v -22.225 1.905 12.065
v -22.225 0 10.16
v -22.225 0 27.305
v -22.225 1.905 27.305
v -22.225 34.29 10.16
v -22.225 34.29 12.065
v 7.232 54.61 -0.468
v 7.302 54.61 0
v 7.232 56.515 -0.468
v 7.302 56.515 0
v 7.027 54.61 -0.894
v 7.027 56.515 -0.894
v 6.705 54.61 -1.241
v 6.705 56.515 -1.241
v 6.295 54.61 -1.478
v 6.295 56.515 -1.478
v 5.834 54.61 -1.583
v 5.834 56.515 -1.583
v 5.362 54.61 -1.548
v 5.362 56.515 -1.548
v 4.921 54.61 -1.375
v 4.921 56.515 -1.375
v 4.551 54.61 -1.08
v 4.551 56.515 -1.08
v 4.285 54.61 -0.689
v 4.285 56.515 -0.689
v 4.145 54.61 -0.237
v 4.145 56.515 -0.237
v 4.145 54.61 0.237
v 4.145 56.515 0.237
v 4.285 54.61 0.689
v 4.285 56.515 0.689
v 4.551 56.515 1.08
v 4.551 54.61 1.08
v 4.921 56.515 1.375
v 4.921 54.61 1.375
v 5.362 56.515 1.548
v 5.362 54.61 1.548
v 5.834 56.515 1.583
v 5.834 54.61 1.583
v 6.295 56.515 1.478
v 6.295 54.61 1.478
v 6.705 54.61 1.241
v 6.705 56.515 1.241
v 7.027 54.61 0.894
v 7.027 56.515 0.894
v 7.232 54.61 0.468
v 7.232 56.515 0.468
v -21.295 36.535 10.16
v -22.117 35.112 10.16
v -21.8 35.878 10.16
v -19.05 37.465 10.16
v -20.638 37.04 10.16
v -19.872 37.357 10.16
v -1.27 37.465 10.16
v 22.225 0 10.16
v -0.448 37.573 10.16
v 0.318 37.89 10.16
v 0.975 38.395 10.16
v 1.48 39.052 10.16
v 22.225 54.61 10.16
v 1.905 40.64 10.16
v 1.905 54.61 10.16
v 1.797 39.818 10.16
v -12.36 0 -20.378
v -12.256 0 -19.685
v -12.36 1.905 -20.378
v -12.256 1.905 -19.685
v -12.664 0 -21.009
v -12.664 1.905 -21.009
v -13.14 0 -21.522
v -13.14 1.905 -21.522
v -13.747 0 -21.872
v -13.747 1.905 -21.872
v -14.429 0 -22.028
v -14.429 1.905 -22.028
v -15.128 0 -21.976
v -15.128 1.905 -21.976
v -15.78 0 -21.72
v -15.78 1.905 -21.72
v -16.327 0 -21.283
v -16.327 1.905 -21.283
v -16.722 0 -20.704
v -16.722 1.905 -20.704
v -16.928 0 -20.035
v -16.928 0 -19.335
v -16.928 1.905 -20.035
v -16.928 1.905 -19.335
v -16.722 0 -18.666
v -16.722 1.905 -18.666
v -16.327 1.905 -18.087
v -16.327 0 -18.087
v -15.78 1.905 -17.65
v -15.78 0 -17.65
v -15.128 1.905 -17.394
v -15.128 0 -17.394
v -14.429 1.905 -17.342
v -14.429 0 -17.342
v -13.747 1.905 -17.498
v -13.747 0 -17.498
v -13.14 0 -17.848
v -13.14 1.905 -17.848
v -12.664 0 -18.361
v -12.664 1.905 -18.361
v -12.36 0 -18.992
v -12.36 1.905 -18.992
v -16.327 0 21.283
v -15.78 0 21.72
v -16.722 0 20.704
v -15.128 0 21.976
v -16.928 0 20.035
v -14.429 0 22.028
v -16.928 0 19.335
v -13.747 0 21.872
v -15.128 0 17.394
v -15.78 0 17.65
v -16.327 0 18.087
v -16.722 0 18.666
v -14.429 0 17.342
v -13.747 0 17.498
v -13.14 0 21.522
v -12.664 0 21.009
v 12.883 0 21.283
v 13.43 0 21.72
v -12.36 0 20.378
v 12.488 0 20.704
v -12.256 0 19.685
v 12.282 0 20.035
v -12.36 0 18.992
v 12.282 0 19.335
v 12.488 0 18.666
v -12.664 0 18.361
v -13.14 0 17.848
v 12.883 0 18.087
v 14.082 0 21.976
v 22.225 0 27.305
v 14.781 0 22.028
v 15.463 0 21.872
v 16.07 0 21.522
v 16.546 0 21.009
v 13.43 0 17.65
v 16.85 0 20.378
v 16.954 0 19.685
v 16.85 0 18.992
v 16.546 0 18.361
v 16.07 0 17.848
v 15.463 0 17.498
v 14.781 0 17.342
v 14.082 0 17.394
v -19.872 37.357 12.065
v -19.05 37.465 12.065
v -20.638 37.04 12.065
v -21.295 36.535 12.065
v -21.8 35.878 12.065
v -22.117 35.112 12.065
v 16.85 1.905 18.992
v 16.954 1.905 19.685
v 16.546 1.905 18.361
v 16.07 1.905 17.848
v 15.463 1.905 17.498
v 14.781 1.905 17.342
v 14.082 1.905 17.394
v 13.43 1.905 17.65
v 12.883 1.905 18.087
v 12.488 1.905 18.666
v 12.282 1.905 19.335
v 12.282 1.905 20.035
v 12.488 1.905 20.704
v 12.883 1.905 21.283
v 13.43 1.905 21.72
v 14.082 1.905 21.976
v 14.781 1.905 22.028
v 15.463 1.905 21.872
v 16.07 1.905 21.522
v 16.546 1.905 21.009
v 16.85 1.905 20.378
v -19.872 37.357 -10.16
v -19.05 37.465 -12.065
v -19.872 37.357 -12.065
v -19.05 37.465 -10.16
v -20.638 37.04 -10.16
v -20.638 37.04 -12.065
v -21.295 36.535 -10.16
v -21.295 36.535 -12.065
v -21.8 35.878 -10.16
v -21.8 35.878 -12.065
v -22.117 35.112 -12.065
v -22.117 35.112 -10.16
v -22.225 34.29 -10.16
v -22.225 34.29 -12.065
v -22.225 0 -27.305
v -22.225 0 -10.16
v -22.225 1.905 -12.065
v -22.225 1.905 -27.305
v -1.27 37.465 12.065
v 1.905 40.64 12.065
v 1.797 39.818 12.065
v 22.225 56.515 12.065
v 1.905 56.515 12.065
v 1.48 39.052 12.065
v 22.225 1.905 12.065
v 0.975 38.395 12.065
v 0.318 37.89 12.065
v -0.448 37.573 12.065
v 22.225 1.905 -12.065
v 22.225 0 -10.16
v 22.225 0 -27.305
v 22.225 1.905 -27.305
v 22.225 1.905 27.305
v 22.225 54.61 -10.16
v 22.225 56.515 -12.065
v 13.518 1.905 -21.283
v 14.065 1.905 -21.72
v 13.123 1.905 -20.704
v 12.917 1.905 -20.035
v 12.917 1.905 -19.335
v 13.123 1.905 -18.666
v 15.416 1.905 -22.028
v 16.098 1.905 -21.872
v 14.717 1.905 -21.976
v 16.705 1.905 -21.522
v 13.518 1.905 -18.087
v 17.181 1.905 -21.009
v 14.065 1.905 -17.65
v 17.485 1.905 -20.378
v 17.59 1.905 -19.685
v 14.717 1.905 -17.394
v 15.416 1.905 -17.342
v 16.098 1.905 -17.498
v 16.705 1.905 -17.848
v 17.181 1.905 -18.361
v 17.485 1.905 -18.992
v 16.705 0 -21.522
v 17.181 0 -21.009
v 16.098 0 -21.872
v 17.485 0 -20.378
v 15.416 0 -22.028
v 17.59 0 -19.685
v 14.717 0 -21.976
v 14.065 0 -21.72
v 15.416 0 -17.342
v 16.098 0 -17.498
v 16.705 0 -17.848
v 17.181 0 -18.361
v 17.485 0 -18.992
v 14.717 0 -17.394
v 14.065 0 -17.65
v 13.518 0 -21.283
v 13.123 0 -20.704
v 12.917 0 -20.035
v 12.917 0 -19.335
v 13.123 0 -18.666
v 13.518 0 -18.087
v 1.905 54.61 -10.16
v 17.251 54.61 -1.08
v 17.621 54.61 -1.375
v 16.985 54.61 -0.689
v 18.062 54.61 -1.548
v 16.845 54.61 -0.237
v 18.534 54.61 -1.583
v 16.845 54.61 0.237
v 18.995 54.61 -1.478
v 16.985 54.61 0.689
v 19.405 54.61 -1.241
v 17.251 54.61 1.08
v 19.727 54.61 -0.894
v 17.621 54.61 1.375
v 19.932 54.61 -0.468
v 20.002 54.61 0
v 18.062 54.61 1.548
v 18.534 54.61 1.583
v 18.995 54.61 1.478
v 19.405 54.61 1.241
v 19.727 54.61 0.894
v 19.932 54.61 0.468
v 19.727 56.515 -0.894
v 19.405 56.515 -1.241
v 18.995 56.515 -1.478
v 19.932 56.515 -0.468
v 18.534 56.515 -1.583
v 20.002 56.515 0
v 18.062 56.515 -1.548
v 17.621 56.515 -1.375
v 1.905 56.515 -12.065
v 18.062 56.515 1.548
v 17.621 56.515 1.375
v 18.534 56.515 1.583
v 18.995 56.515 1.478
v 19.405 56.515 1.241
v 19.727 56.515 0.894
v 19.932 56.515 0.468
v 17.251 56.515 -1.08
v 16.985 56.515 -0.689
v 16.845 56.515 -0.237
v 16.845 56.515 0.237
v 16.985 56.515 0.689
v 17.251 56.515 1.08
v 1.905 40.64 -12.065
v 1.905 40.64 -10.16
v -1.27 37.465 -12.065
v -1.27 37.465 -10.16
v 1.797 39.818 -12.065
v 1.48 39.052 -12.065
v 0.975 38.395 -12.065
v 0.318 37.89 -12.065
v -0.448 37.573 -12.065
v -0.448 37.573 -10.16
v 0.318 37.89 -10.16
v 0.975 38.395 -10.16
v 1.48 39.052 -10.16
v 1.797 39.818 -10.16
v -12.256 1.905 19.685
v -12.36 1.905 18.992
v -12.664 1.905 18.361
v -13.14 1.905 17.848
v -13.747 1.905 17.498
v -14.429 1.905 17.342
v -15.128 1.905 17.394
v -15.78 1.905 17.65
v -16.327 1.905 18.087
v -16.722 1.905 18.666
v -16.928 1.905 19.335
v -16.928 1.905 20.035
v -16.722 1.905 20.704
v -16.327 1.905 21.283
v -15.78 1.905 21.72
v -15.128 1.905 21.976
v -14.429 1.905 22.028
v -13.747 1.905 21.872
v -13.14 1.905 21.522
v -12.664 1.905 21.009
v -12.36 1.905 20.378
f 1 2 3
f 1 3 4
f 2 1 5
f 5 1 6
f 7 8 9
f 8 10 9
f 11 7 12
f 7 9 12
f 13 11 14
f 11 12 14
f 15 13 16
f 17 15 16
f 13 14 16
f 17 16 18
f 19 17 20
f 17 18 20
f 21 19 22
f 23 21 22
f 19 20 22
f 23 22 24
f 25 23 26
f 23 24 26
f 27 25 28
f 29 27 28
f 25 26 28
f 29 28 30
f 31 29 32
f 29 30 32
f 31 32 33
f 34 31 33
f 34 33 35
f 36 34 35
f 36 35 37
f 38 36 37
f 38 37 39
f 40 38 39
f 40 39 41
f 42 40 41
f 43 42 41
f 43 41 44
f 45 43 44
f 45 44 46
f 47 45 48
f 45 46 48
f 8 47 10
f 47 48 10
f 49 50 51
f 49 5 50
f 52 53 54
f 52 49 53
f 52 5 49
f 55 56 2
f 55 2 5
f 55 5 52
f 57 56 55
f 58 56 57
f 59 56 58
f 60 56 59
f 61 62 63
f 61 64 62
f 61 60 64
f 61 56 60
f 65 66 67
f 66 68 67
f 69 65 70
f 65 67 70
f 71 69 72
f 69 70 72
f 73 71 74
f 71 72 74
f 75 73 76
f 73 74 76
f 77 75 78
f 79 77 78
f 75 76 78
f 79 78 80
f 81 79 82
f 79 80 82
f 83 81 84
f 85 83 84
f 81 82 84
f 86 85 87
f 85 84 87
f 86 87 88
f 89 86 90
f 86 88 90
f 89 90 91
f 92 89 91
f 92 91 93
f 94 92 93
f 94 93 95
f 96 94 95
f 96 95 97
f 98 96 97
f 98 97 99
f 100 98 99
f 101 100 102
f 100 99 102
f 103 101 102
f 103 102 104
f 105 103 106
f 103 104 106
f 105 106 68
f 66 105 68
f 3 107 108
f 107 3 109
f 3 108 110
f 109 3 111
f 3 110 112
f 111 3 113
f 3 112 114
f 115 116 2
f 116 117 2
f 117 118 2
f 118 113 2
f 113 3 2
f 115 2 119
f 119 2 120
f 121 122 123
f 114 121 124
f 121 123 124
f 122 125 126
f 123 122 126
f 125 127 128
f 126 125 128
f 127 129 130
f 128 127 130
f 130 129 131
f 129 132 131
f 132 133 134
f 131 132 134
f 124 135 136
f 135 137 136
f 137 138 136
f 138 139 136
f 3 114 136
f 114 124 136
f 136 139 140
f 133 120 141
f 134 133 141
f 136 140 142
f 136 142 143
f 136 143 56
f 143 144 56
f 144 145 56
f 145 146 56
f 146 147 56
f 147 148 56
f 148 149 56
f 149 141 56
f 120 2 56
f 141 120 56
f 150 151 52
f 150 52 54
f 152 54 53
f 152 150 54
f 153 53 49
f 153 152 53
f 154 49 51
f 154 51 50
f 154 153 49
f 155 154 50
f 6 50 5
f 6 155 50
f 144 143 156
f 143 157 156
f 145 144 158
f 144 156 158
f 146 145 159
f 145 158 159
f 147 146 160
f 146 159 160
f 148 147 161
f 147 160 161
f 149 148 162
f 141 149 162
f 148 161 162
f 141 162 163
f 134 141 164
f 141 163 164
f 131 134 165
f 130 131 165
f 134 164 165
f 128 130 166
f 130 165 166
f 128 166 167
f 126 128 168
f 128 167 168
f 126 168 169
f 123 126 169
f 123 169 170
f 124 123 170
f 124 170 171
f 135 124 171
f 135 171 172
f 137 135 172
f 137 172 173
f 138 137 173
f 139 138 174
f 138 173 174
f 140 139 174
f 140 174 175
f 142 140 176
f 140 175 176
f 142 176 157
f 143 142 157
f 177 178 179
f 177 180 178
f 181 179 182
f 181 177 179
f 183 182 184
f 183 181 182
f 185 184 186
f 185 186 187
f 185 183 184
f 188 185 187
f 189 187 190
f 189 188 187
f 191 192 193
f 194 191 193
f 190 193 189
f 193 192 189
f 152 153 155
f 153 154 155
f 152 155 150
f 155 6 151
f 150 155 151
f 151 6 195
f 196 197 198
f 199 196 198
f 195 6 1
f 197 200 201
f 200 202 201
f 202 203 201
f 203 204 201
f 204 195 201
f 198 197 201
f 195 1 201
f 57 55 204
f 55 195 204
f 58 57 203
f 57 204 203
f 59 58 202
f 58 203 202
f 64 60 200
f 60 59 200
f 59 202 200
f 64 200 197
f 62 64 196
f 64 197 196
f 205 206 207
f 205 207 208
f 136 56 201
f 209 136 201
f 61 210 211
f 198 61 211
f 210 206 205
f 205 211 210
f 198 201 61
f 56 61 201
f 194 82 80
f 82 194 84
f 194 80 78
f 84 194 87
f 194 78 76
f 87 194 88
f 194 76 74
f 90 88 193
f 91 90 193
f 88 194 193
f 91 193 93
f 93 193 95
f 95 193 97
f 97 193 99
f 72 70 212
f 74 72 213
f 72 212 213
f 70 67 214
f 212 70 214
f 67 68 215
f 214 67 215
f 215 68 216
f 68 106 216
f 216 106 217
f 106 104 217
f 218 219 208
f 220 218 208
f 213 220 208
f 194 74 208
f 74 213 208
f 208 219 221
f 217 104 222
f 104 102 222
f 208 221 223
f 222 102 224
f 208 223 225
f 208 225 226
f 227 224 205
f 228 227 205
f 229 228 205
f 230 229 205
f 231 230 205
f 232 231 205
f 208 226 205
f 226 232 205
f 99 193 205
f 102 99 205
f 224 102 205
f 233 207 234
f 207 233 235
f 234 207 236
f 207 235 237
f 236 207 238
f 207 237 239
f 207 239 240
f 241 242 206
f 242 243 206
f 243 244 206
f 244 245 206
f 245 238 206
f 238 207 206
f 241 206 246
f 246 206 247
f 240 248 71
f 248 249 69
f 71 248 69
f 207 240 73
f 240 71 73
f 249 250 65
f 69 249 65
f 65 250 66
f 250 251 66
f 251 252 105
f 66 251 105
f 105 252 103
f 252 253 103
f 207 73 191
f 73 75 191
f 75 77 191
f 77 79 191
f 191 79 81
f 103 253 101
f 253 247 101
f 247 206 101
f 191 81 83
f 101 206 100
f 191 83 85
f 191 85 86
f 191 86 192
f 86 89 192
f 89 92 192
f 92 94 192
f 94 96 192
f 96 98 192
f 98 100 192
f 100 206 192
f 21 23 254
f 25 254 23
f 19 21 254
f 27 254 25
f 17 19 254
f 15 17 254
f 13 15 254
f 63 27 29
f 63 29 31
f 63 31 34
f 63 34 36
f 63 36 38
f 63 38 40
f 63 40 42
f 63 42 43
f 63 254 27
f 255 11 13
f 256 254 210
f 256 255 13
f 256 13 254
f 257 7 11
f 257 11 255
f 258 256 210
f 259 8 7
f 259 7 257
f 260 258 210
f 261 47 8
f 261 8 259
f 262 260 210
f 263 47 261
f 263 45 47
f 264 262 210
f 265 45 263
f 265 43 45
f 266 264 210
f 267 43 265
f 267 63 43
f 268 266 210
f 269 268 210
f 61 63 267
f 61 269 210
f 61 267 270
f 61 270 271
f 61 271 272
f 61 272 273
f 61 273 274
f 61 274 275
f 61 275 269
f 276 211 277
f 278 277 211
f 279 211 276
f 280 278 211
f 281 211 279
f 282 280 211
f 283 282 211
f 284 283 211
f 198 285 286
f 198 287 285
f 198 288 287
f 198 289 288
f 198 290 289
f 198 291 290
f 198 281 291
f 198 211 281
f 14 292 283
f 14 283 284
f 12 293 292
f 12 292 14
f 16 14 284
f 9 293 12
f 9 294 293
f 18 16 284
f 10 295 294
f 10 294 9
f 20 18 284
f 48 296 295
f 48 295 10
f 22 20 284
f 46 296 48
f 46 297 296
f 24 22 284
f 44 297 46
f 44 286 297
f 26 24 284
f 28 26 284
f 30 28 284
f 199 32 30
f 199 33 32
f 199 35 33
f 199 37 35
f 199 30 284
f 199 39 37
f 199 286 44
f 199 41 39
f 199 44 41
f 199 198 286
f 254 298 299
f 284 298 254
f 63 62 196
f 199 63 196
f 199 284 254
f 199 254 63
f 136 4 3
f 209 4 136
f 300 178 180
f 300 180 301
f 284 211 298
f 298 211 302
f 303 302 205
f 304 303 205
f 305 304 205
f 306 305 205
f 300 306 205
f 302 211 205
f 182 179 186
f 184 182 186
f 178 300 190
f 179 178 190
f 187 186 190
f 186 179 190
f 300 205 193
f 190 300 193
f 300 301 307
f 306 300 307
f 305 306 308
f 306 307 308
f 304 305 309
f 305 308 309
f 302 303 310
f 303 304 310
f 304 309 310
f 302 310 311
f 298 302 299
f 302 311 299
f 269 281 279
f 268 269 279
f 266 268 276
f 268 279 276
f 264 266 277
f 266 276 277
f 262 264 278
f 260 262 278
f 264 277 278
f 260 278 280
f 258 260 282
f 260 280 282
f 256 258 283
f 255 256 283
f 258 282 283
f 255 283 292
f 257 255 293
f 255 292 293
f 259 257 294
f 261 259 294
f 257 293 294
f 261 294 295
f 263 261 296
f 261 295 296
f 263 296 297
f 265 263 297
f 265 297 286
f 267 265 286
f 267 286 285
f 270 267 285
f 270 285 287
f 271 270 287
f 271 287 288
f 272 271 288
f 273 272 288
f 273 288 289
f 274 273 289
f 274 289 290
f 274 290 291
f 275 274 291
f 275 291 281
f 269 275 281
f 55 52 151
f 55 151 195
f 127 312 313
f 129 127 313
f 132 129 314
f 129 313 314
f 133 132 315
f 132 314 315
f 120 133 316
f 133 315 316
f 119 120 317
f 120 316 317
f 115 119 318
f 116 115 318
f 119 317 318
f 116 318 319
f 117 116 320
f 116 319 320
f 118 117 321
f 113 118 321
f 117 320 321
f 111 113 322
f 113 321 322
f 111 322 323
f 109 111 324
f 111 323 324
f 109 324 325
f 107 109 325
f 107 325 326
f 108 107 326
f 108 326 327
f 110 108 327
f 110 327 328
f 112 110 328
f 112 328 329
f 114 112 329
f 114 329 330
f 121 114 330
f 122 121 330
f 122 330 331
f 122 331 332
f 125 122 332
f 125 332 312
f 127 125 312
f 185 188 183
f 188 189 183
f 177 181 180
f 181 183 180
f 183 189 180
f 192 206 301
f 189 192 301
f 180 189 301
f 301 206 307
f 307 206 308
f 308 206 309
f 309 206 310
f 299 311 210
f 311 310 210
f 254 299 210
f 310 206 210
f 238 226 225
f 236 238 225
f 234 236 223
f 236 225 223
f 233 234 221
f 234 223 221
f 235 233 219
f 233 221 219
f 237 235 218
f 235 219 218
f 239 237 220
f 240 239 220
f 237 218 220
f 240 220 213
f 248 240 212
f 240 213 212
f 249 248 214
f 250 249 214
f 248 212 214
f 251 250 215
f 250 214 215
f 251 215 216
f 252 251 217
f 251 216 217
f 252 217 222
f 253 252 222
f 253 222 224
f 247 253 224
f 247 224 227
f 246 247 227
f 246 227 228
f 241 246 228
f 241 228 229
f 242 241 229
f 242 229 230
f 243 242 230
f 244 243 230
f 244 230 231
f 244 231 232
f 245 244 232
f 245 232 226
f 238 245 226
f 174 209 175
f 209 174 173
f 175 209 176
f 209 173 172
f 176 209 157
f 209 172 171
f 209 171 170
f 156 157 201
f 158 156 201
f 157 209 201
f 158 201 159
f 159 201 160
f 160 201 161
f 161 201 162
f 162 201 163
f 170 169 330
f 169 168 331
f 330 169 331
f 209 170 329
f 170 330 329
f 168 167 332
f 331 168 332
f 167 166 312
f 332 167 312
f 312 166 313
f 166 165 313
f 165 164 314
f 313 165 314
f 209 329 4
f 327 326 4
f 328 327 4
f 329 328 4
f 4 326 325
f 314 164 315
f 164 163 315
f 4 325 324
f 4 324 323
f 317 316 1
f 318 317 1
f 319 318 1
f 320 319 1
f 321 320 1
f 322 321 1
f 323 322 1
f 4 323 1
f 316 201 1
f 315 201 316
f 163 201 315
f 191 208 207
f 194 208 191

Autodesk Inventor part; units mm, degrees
ref_plane "YZ Plane" through (0, 0, 0) normal (1, 0, 0) x (0, 1, 0)
ref_plane "XZ Plane" through (0, 0, 0) normal (0, 1, 0) x (-1, 0, 0)
ref_plane "XY Plane" through (0, 0, 0) normal (0, 0, 1) x (1, 0, 0)
sketch "Sketch1" plane through (0, 0, 0) normal (0, 1, 0) x (-1, 0, 0)
  line L0 (20.32, 10.16) -> (-20.32, 10.16)
  line L1 (-20.32, 10.16) -> (-20.32, -10.16)
  line L2 (-20.32, -10.16) -> (20.32, -10.16)
  line L3 (20.32, -10.16) -> (20.32, 10.16)
  line L4 (22.225, 12.065) -> (-22.225, 12.065)
  line L5 (-22.225, 12.065) -> (-22.225, -12.065)
  line L6 (-22.225, -12.065) -> (22.225, -12.065)
  line L7 (22.225, -12.065) -> (22.225, 12.065)
  point P0 (0, 0)
  dimension "d0" = 40.64
  dimension "d1" = 20.32
  dimension "d2" = 40.64
  dimension "d3" = 44.45
  dimension "d4" = 24.13
  dimension "d5" = 44.45
extrude "Extrusion1" add sketch "Sketch1" along normal blind 56.515
sketch "Sketch2" plane through (-20.32, 0, -10.16) normal (1, 0, 0) x (0, 0, -1)
  line L0 (0, 0) -> (-20.32, 0) projected
  line L1 (0, 0) -> (0, 56.515) projected
  line L2 (-20.32, 56.515) -> (0, 56.515) projected
  line L3 (-20.32, 0) -> (-20.32, 56.515) projected
  point P0 (-10.16, 0)
extrude "Extrusion2" cut sketch "Sketch2" against normal blind 56.515
sketch "Sketch3" plane through (20.32, 0, 10.16) normal (-1, 0, 0) x (0, 0, 1)
  line L0 (0, 0) -> (-20.32, 0) projected
  line L1 (0, 0) -> (0, 56.515) projected
  line L2 (-20.32, 56.515) -> (0, 56.515) projected
  line L3 (-20.32, 0) -> (-20.32, 56.515) projected
  point P0 (-10.16, 0)
extrude "Extrusion3" cut sketch "Sketch3" against normal blind 56.515
sketch "Sketch4" plane through (22.225, 0, 10.16) normal (0, 0, -1) x (-1, 0, 0)
  line L0 (44.45, 56.515) -> (44.45, 0) projected
  line L1 (0, 56.515) -> (44.45, 56.515) projected
  line L2 (0, 0) -> (0, 56.515) projected
  line L3 (44.45, 54.61) -> (0, 54.61)
  point P0 (22.225, 0)
extrude "Extrusion4" add sketch "Sketch4" along normal blind 20.32
sketch "Sketch5" plane through (-22.225, 0, 12.065) normal (0, 0, 1) x (1, 0, 0)
  line L0 (0, 0) -> (44.45, 0) projected
  line L1 (44.45, 0) -> (44.45, 56.515) projected
  line L2 (0, 0) -> (0, 56.515) projected
  line L3 (44.45, 1.905) -> (0, 1.905)
  point P0 (22.225, 0)
extrude "Extrusion5" add sketch "Sketch5" along normal blind 15.24
sketch "Sketch6" plane through (22.225, 0, -12.065) normal (0, 0, -1) x (-1, 0, 0)
  line L0 (0, 0) -> (44.45, 0) projected
  line L1 (44.45, 0) -> (44.45, 56.515) projected
  line L2 (0, 0) -> (0, 56.515) projected
  line L3 (44.45, 1.905) -> (0, 1.905)
  point P0 (22.225, 0)
extrude "Extrusion6" add sketch "Sketch6" along normal blind 15.24
sketch "Sketch7" plane through (0, 56.515, 0) normal (0, 1, 0) x (1, 0, 0)
  circle A0 centre (18.415, 0) radius 1.5875
  circle A1 centre (5.715, 0) radius 1.5875
  circle A2 centre (-12.065, 0) radius 3.175
  point P0 (0, 0)
  dimension "d18" = 3.175
  dimension "d19" = 3.175
  dimension "d20" = 6.35
extrude "Extrusion7" cut sketch "Sketch7" against normal blind 15.24
sketch "Sketch8" plane through (-22.225, 1.905, 12.065) normal (0, 1, 0) x (1, 0, 0)
  circle A0 centre (7.62, -7.62) radius 2.3495
  circle A1 centre (36.83, -7.62) radius 2.3495
  point P0 (22.225, 12.065)
  dimension "d23" = 4.699
  dimension "d24" = 4.699
extrude "Extrusion8" cut sketch "Sketch8" against normal blind 15.24
sketch "Sketch9" plane through (-22.225, 1.905, -12.065) normal (0, 1, 0) x (1, 0, 0)
  circle A0 centre (7.62, 7.62) radius 2.3495
  circle A1 centre (37.465, 7.62) radius 2.3495
  point P0 (22.225, -12.065)
  dimension "d27" = 4.699
  dimension "d28" = 4.699
extrude "Extrusion9" cut sketch "Sketch9" against normal blind 15.24
sketch "Sketch10" plane through (0, 56.515, 0) normal (0, 1, 0) x (1, 0, 0)
  circle A0 centre (-12.065, 0) radius 3.175 projected
  line L0 (-22.225, 12.065) -> (-22.225, -12.065) projected
  line L1 (-22.225, -12.065) -> (22.225, -12.065) projected
  line L2 (22.225, 12.065) -> (-22.225, 12.065) projected
  line L3 (1.905, 12.065) -> (1.905, -12.065)
  point P0 (0, 0)
extrude "Extrusion10" cut sketch "Sketch10" against normal blind 19.05
fillet "Fillet1" radius 3.175 1 edges at (-22.225, 37.465, 11.1125)
fillet "Fillet2" radius 3.175 1 edges at (-22.225, 37.465, -11.1125)
fillet "Fillet3" radius 3.175 1 edges at (1.905, 37.465, 11.1125)
fillet "Fillet4" radius 3.175 1 edges at (1.905, 37.465, -11.1125)
properties part number "Autonomous - Ultrasonic Servo Mount"
